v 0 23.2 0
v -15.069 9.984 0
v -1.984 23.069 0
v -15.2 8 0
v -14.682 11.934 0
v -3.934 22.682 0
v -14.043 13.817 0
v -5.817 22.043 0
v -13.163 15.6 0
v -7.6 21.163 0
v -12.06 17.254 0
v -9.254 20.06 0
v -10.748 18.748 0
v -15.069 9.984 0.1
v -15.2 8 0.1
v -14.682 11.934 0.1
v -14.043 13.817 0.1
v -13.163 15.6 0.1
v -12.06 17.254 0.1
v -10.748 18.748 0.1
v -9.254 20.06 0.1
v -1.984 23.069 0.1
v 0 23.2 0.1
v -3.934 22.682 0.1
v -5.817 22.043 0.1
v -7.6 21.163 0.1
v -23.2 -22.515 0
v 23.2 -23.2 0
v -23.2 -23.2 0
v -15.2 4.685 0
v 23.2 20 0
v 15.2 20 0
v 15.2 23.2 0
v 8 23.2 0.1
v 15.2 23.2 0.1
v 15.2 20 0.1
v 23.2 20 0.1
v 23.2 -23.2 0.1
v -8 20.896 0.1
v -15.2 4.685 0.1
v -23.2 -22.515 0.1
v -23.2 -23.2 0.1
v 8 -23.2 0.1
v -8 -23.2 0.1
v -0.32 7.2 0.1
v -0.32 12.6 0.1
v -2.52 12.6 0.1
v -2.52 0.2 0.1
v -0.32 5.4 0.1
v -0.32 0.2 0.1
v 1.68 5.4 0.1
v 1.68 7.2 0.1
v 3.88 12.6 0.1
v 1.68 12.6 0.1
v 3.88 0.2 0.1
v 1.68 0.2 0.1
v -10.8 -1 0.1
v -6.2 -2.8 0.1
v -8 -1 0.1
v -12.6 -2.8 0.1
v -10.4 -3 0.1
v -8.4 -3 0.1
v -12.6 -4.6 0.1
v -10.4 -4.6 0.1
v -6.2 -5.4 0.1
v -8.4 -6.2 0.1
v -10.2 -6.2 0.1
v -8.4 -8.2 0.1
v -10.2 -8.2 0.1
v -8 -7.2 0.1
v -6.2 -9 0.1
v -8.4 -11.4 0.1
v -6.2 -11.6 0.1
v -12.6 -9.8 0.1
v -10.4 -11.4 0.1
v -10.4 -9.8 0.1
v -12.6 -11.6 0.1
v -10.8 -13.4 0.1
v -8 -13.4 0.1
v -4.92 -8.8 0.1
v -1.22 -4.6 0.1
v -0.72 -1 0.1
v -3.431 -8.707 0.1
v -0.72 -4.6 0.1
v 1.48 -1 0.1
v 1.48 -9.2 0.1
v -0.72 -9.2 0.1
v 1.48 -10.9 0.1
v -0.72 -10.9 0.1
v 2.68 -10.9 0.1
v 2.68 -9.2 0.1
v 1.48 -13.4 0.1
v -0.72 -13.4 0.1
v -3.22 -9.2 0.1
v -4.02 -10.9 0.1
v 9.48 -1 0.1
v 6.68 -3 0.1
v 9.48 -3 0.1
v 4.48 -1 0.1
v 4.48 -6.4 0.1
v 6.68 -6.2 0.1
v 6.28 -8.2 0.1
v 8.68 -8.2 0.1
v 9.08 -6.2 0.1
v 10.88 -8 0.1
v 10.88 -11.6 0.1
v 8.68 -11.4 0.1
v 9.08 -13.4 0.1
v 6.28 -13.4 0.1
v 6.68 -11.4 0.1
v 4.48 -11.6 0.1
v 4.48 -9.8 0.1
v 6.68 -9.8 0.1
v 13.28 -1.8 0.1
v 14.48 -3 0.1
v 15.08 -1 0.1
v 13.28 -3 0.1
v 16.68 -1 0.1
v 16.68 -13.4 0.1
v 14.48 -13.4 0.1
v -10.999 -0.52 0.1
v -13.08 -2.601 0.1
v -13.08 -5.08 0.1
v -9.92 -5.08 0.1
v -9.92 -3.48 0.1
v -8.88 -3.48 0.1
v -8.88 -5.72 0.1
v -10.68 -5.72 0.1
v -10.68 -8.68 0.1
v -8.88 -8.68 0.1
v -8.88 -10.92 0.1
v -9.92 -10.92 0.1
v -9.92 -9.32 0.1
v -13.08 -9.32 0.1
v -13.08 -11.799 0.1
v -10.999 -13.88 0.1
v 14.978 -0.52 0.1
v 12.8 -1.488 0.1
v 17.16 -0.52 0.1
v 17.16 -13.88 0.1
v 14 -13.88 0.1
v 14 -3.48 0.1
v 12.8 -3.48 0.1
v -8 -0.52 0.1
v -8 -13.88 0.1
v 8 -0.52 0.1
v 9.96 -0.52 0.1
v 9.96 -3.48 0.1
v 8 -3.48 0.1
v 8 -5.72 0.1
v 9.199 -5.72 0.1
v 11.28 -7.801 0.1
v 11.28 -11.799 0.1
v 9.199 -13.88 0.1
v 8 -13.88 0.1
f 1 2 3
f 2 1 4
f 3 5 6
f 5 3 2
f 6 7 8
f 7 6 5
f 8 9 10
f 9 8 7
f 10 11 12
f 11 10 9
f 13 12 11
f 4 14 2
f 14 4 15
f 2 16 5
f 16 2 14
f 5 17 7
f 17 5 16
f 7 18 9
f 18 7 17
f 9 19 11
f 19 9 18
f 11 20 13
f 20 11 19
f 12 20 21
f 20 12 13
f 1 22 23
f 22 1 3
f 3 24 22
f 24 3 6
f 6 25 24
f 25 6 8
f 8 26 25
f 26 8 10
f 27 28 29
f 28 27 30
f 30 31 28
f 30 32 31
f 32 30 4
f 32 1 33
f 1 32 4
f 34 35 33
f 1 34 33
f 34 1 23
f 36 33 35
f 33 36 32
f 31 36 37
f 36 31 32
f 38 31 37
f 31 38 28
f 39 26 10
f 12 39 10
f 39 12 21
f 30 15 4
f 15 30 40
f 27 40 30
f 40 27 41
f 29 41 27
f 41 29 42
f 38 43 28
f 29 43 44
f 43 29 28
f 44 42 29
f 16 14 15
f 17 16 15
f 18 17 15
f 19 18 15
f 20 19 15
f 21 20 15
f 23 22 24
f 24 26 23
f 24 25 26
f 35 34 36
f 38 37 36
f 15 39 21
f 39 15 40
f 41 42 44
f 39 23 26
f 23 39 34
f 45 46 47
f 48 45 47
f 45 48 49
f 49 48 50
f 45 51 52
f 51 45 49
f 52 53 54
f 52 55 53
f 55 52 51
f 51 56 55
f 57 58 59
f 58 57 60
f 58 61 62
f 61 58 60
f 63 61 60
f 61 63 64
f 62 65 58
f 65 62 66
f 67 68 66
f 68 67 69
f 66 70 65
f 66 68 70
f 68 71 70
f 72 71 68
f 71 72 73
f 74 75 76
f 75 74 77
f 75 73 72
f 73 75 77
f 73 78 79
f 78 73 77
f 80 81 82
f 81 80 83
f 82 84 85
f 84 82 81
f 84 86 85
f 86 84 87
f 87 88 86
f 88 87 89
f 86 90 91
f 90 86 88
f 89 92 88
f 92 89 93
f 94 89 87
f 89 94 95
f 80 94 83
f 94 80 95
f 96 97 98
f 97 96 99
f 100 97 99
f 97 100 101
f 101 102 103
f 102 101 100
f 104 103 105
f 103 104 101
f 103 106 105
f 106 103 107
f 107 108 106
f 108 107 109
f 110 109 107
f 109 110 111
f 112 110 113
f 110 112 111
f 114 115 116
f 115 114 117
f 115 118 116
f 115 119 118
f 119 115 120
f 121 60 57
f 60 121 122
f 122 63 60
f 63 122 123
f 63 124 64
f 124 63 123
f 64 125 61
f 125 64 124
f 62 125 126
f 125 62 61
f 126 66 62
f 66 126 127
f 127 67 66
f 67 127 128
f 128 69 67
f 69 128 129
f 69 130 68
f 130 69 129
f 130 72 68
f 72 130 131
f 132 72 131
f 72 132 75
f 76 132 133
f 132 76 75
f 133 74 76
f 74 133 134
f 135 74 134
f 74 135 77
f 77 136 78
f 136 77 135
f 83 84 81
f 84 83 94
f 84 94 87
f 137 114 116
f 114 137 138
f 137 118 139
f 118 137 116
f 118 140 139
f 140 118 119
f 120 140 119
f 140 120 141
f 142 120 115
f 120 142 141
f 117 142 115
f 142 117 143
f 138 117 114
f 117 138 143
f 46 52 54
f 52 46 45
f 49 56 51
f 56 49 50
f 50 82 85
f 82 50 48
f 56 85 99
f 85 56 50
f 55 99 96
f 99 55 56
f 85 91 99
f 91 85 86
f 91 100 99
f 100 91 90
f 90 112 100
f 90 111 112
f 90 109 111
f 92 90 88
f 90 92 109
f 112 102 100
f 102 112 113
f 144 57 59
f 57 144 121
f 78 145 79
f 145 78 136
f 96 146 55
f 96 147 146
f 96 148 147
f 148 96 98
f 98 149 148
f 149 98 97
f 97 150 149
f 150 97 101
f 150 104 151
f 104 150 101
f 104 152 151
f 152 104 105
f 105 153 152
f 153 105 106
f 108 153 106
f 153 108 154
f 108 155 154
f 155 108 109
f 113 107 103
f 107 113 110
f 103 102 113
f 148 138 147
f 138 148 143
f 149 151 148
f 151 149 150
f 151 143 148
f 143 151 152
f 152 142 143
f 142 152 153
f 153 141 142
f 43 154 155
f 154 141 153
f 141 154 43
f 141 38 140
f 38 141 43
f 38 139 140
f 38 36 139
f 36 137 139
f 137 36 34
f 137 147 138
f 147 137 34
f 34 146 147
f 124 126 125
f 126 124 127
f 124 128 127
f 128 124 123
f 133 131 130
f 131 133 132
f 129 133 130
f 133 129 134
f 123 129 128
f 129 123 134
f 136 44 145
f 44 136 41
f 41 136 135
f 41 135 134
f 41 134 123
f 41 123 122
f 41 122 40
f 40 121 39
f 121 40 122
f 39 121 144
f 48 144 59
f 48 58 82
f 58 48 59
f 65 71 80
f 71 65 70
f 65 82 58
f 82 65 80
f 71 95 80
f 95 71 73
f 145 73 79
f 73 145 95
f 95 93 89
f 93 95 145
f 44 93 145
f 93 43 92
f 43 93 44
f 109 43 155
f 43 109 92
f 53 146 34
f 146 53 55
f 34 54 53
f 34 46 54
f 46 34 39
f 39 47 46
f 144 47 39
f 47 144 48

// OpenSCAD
// file: ../p/48/7-48cyli.scad
use <../../lib.scad>
function ldraw_lib__48__7_48cyli() = [
// 0 Hi-Res Cylinder 0.1458
// 0 Name: 48\7-48cyli.dat
// 0 Author: Philippe Hurbain [Philo]
// 0 !LDRAW_ORG 48_Primitive UPDATE 2013-01
// 0 !LICENSE Licensed under CC BY 4.0 : see CAreadme.txt
// 
// 0 BFC CERTIFY CCW
  [0,"BFC","CERTIFY"],
  [0,"BFC","CCW"],
// 
// 0 !HISTORY 2013-07-21 [PTadmin] Official Update 2013-01
// 
// 
// 4 16 0.9914 0 0.1305 1 0 0 1 1 0 0.9914 1 0.1305
  [4,16,0.9914,0,0.1305,1,0,0,1,1,0,0.9914,1,0.1305],
// 4 16 0.9659 0 0.2588 0.9914 0 0.1305 0.9914 1 0.1305 0.9659 1 0.2588
  [4,16,0.9659,0,0.2588,0.9914,0,0.1305,0.9914,1,0.1305,0.9659,1,0.2588],
// 4 16 0.9239 0 0.3827 0.9659 0 0.2588 0.9659 1 0.2588 0.9239 1 0.3827
  [4,16,0.9239,0,0.3827,0.9659,0,0.2588,0.9659,1,0.2588,0.9239,1,0.3827],
// 4 16 0.866 0 0.5 0.9239 0 0.3827 0.9239 1 0.3827 0.866 1 0.5
  [4,16,0.866,0,0.5,0.9239,0,0.3827,0.9239,1,0.3827,0.866,1,0.5],
// 4 16 0.7934 0 0.6088 0.866 0 0.5 0.866 1 0.5 0.7934 1 0.6088
  [4,16,0.7934,0,0.6088,0.866,0,0.5,0.866,1,0.5,0.7934,1,0.6088],
// 4 16 0.7071 0 0.7071 0.7934 0 0.6088 0.7934 1 0.6088 0.7071 1 0.7071
  [4,16,0.7071,0,0.7071,0.7934,0,0.6088,0.7934,1,0.6088,0.7071,1,0.7071],
// 4 16 0.6088 0 0.7934 0.7071 0 0.7071 0.7071 1 0.7071 0.6088 1 0.7934
  [4,16,0.6088,0,0.7934,0.7071,0,0.7071,0.7071,1,0.7071,0.6088,1,0.7934],
// 0 // conditional lines
// 5 24 1 1 0 1 0 0 1 1 -0.1317 0.9914 1 0.1305
  [5,24,1,1,0,1,0,0,1,1,-0.1317,0.9914,1,0.1305],
// 5 24 0.9914 1 0.1305 0.9914 0 0.1305 1 1 0 0.9659 1 0.2588
  [5,24,0.9914,1,0.1305,0.9914,0,0.1305,1,1,0,0.9659,1,0.2588],
// 5 24 0.9659 1 0.2588 0.9659 0 0.2588 0.9914 1 0.1305 0.9239 1 0.3827
  [5,24,0.9659,1,0.2588,0.9659,0,0.2588,0.9914,1,0.1305,0.9239,1,0.3827],
// 5 24 0.9239 1 0.3827 0.9239 0 0.3827 0.9659 1 0.2588 0.866 1 0.5
  [5,24,0.9239,1,0.3827,0.9239,0,0.3827,0.9659,1,0.2588,0.866,1,0.5],
// 5 24 0.866 1 0.5 0.866 0 0.5 0.9239 1 0.3827 0.7934 1 0.6088
  [5,24,0.866,1,0.5,0.866,0,0.5,0.9239,1,0.3827,0.7934,1,0.6088],
// 5 24 0.7934 1 0.6088 0.7934 0 0.6088 0.866 1 0.5 0.7071 1 0.7071
  [5,24,0.7934,1,0.6088,0.7934,0,0.6088,0.866,1,0.5,0.7071,1,0.7071],
// 5 24 0.7071 1 0.7071 0.7071 0 0.7071 0.7934 1 0.6088 0.6088 1 0.7934
  [5,24,0.7071,1,0.7071,0.7071,0,0.7071,0.7934,1,0.6088,0.6088,1,0.7934],
// 5 24 0.6088 1 0.7934 0.6088 0 0.7934 0.7071 1 0.7071 0.5043 1 0.8735
  [5,24,0.6088,1,0.7934,0.6088,0,0.7934,0.7071,1,0.7071,0.5043,1,0.8735],
// 0 // Build by Primitive Generator 2
];
module ldraw_lib__48__7_48cyli(step=0, col=false, unit=2/5, alt=false, line=0.2, solid=!$preview)
    makepoly(ldraw_lib__48__7_48cyli(), step=step, col=col, unit=unit, alt=alt, line=line, solid=solid);
ldraw_lib__48__7_48cyli(line=0.2);
// file: ../p/48/7-48chrd.scad
use <../../lib.scad>
function ldraw_lib__48__7_48chrd() = [
// 0 Hi-Res Chord 0.1458
// 0 Name: 48\7-48chrd.dat
// 0 Author: Philippe Hurbain [Philo]
// 0 !LDRAW_ORG 48_Primitive UPDATE 2013-01
// 0 !LICENSE Licensed under CC BY 4.0 : see CAreadme.txt
// 
// 0 BFC CERTIFY CCW
  [0,"BFC","CERTIFY"],
  [0,"BFC","CCW"],
// 
// 0 !HISTORY 2013-07-21 [PTadmin] Official Update 2013-01
// 
// 
// 3 16 1 0 0 0.9914 0 0.1305 0.9659 0 0.2588
  [3,16,1,0,0,0.9914,0,0.1305,0.9659,0,0.2588],
// 3 16 1 0 0 0.9659 0 0.2588 0.9239 0 0.3827
  [3,16,1,0,0,0.9659,0,0.2588,0.9239,0,0.3827],
// 3 16 1 0 0 0.9239 0 0.3827 0.866 0 0.5
  [3,16,1,0,0,0.9239,0,0.3827,0.866,0,0.5],
// 3 16 1 0 0 0.866 0 0.5 0.7934 0 0.6088
  [3,16,1,0,0,0.866,0,0.5,0.7934,0,0.6088],
// 3 16 1 0 0 0.7934 0 0.6088 0.7071 0 0.7071
  [3,16,1,0,0,0.7934,0,0.6088,0.7071,0,0.7071],
// 3 16 1 0 0 0.7071 0 0.7071 0.6088 0 0.7934
  [3,16,1,0,0,0.7071,0,0.7071,0.6088,0,0.7934],
// 0 // Build by Primitive Generator 2
];
module ldraw_lib__48__7_48chrd(step=0, col=false, unit=2/5, alt=false, line=0.2, solid=!$preview)
    makepoly(ldraw_lib__48__7_48chrd(), step=step, col=col, unit=unit, alt=alt, line=line, solid=solid);
ldraw_lib__48__7_48chrd(line=0.2);
// file: ../p/48/1-4chrd.scad
use <../../lib.scad>
function ldraw_lib__48__1_4chrd() = [
// 0 Hi-Res Chord 0.25
// 0 Name: 48\1-4chrd.dat
// 0 Author: Willy Tschager [Holly-Wood]
// 0 !LDRAW_ORG 48_Primitive UPDATE 2024-01
// 0 !LICENSE Licensed under CC BY 4.0 : see CAreadme.txt
// 
// 0 BFC CERTIFY CCW
  [0,"BFC","CERTIFY"],
  [0,"BFC","CCW"],
// 
// 0 !HISTORY 2009-05-02 [PTadmin] Official Update 2009-01
// 0 !HISTORY 2012-08-02 [MMR1988] Re-creation with PrimGen2 and Rectifier
// 0 !HISTORY 2012-08-09 [PTadmin] Official Update 2012-02
// 0 !HISTORY 2024-01-04 [Holly-Wood] Complete re-write, original by westrate
// 0 !HISTORY 2024-01-29 [OrionP] Official Update 2024-01
// 
// 0 // Vertices calculated by LDPartEditor (PrimGen 2.X)
// 
// 4 16 0 0 1 1 0 0 .9914 0 .1305 .1305 0 .9914
  [4,16,0,0,1,1,0,0,.9914,0,.1305,.1305,0,.9914],
// 4 16 .1305 0 .9914 .9914 0 .1305 .9659 0 .2588 .2588 0 .9659
  [4,16,.1305,0,.9914,.9914,0,.1305,.9659,0,.2588,.2588,0,.9659],
// 4 16 .2588 0 .9659 .9659 0 .2588 .9239 0 .3827 .3827 0 .9239
  [4,16,.2588,0,.9659,.9659,0,.2588,.9239,0,.3827,.3827,0,.9239],
// 4 16 .3827 0 .9239 .9239 0 .3827 .866 0 .5 .5 0 .866
  [4,16,.3827,0,.9239,.9239,0,.3827,.866,0,.5,.5,0,.866],
// 4 16 .5 0 .866 .866 0 .5 .7934 0 .6088 .6088 0 .7934
  [4,16,.5,0,.866,.866,0,.5,.7934,0,.6088,.6088,0,.7934],
// 3 16 .6088 0 .7934 .7934 0 .6088 .7071 0 .7071
  [3,16,.6088,0,.7934,.7934,0,.6088,.7071,0,.7071],
];
module ldraw_lib__48__1_4chrd(step=0, col=false, unit=2/5, alt=false, line=0.2, solid=!$preview)
    makepoly(ldraw_lib__48__1_4chrd(), step=step, col=col, unit=unit, alt=alt, line=line, solid=solid);
ldraw_lib__48__1_4chrd(line=0.2);
// file: ../p/48/1-12cyli.scad
use <../../lib.scad>
function ldraw_lib__48__1_12cyli() = [
// 0 Hi-Res Cylinder 0.0833
// 0 Name: 48\1-12cyli.dat
// 0 Author: Willy Tschager [Holly-Wood]
// 0 !LDRAW_ORG 48_Primitive UPDATE 2024-01
// 0 !LICENSE Licensed under CC BY 4.0 : see CAreadme.txt
// 
// 0 BFC CERTIFY CCW
  [0,"BFC","CERTIFY"],
  [0,"BFC","CCW"],
// 
// 0 !HISTORY 2009-05-02 [PTadmin] Official Update 2009-01
// 0 !HISTORY 2024-01-08 [Holly-Wood] Complete regeneration, original by westrate
// 0 !HISTORY 2024-01-29 [OrionP] Official Update 2024-01
// 
// 4 16 0.9914 0 0.1305 1 0 0 1 1 0 0.9914 1 0.1305
  [4,16,0.9914,0,0.1305,1,0,0,1,1,0,0.9914,1,0.1305],
// 4 16 0.9659 0 0.2588 0.9914 0 0.1305 0.9914 1 0.1305 0.9659 1 0.2588
  [4,16,0.9659,0,0.2588,0.9914,0,0.1305,0.9914,1,0.1305,0.9659,1,0.2588],
// 4 16 0.9239 0 0.3827 0.9659 0 0.2588 0.9659 1 0.2588 0.9239 1 0.3827
  [4,16,0.9239,0,0.3827,0.9659,0,0.2588,0.9659,1,0.2588,0.9239,1,0.3827],
// 4 16 0.866 0 0.5 0.9239 0 0.3827 0.9239 1 0.3827 0.866 1 0.5
  [4,16,0.866,0,0.5,0.9239,0,0.3827,0.9239,1,0.3827,0.866,1,0.5],
// 0 // conditional lines
// 5 24 1 1 0 1 0 0 1 1 -0.1317 0.9914 1 0.1305
  [5,24,1,1,0,1,0,0,1,1,-0.1317,0.9914,1,0.1305],
// 5 24 0.9914 1 0.1305 0.9914 0 0.1305 1 1 0 0.9659 1 0.2588
  [5,24,0.9914,1,0.1305,0.9914,0,0.1305,1,1,0,0.9659,1,0.2588],
// 5 24 0.9659 1 0.2588 0.9659 0 0.2588 0.9914 1 0.1305 0.9239 1 0.3827
  [5,24,0.9659,1,0.2588,0.9659,0,0.2588,0.9914,1,0.1305,0.9239,1,0.3827],
// 5 24 0.9239 1 0.3827 0.9239 0 0.3827 0.9659 1 0.2588 0.866 1 0.5
  [5,24,0.9239,1,0.3827,0.9239,0,0.3827,0.9659,1,0.2588,0.866,1,0.5],
// 5 24 0.866 1 0.5 0.866 0 0.5 0.9239 1 0.3827 0.8002 1 0.614
  [5,24,0.866,1,0.5,0.866,0,0.5,0.9239,1,0.3827,0.8002,1,0.614],
// 0 // Build by LDPartEditor (PrimGen 2.X)
];
module ldraw_lib__48__1_12cyli(step=0, col=false, unit=2/5, alt=false, line=0.2, solid=!$preview)
    makepoly(ldraw_lib__48__1_12cyli(), step=step, col=col, unit=unit, alt=alt, line=line, solid=solid);
ldraw_lib__48__1_12cyli(line=0.2);
// file: ../p/48/1-12chrd.scad
use <../../lib.scad>
function ldraw_lib__48__1_12chrd() = [
// 0 Hi-Res Chord 0.0833
// 0 Name: 48\1-12chrd.dat
// 0 Author: Willy Tschager [Holly-Wood]
// 0 !LDRAW_ORG 48_Primitive UPDATE 2024-01
// 0 !LICENSE Licensed under CC BY 4.0 : see CAreadme.txt
// 
// 0 BFC CERTIFY CCW
  [0,"BFC","CERTIFY"],
  [0,"BFC","CCW"],
// 
// 0 !HISTORY 2009-05-02 [PTadmin] Official Update 2009-01
// 0 !HISTORY 2024-01-09 [Holly-Wood] Complete re-write, original by westrate
// 0 !HISTORY 2024-01-29 [OrionP] Official Update 2024-01
// 
// 4 16 .866 0 .5 1 0 0 .9914 0 .1305 .9239 0 .3827
  [4,16,.866,0,.5,1,0,0,.9914,0,.1305,.9239,0,.3827],
// 3 16 .9239 0 .3827 .9914 0 .1305 .9659 0 .2588
  [3,16,.9239,0,.3827,.9914,0,.1305,.9659,0,.2588],
// 0 // Build by LDPartEditor (PrimGen 2.X)
];
module ldraw_lib__48__1_12chrd(step=0, col=false, unit=2/5, alt=false, line=0.2, solid=!$preview)
    makepoly(ldraw_lib__48__1_12chrd(), step=step, col=col, unit=unit, alt=alt, line=line, solid=solid);
ldraw_lib__48__1_12chrd(line=0.2);
// file: s/4162510as01.scad
use <../../lib.scad>
use <../../p/48/1-12chrd.scad>
use <../../p/48/1-12cyli.scad>
use <../../p/48/1-4chrd.scad>
use <../../p/48/7-48chrd.scad>
use <../../p/48/7-48cyli.scad>
function ldraw_lib__s__4162510as01() = [
// 0 ~Sticker  5.8 x  5.8 with Black "H3451" on Blue, Red and White Stripes Left - Common Part
// 0 Name: s\4162510as01.dat
// 0 Author: Massimo Maso [Sirio]
// 0 !LDRAW_ORG Subpart UPDATE 2024-09
// 0 !LICENSE Licensed under CC BY 4.0 : see CAreadme.txt
// 
// 0 BFC CERTIFY CCW
  [0,"BFC","CERTIFY"],
  [0,"BFC","CCW"],
// 
// 0 !HISTORY 2024-10-27 [OrionP] Official Update 2024-09
// 
// 
// 0 // Primitives
// 1 16 0 0 20 38 0 0 0 -1 0 0 0 38 48\1-4chrd.dat
  [1,16,0,0,20,38,0,0,0,-1,0,0,0,38, ldraw_lib__48__1_4chrd()],
// 1 16 0 -0.25 20 38 0 0 0 0.25 0 0 0 38 48\7-48cyli.dat
  [1,16,0,-0.25,20,38,0,0,0,0.25,0,0,0,38, ldraw_lib__48__7_48cyli()],
// 1 16 0 -0.25 20 0 0 38 0 0.25 0 38 0 0 48\1-12cyli.dat
  [1,16,0,-0.25,20,0,0,38,0,0.25,0,38,0,0, ldraw_lib__48__1_12cyli()],
// 0 // Bottom face
// 4 16 -58 0 -58 38 0 11.712 58 0 -56.288 58 0 -58
  [4,16,-58,0,-58,38,0,11.712,58,0,-56.288,58,0,-58],
// 3 16 -58 0 -58 -58 0 50 38 0 11.712
  [3,16,-58,0,-58,-58,0,50,38,0,11.712],
// 4 16 -38 0 50 38 0 20 38 0 11.712 -58 0 50
  [4,16,-38,0,50,38,0,20,38,0,11.712,-58,0,50],
// 4 16 -38 0 50 -38 0 58 0 0 58 38 0 20
  [4,16,-38,0,50,-38,0,58,0,0,58,38,0,20],
// 0 // Lateral face
// 3 16 -38 0 58 -38 -.25 58 -20 -.25 58
  [3,16,-38,0,58,-38,-.25,58,-20,-.25,58],
// 4 16 -38 0 58 -20 -.25 58 0 -.25 58 0 0 58
  [4,16,-38,0,58,-20,-.25,58,0,-.25,58,0,0,58],
// 4 16 -38 0 58 -38 0 50 -38 -.25 50 -38 -.25 58
  [4,16,-38,0,58,-38,0,50,-38,-.25,50,-38,-.25,58],
// 4 16 -58 0 50 -58 -.25 50 -38 -.25 50 -38 0 50
  [4,16,-58,0,50,-58,-.25,50,-38,-.25,50,-38,0,50],
// 4 16 -58 0 50 -58 0 -58 -58 -.25 -58 -58 -.25 50
  [4,16,-58,0,50,-58,0,-58,-58,-.25,-58,-58,-.25,50],
// 3 16 19 0 52.908 19 -.25 52.908 20 -.25 52.24072
  [3,16,19,0,52.908,19,-.25,52.908,20,-.25,52.24072],
// 4 16 19 0 52.908 20 -.25 52.24072 23.1344 -.25 50.1492 23.1344 0 50.1492
  [4,16,19,0,52.908,20,-.25,52.24072,23.1344,-.25,50.1492,23.1344,0,50.1492],
// 4 16 38 0 11.712 38 0 20 38 -.25 20 38 -.25 11.712
  [4,16,38,0,11.712,38,0,20,38,-.25,20,38,-.25,11.712],
// 4 16 38 0 11.712 38 -.25 11.712 58 -.25 -56.288 58 0 -56.288
  [4,16,38,0,11.712,38,-.25,11.712,58,-.25,-56.288,58,0,-56.288],
// 4 16 58 0 -58 58 0 -56.288 58 -.25 -56.288 58 -.25 -58
  [4,16,58,0,-58,58,0,-56.288,58,-.25,-56.288,58,-.25,-58],
// 3 16 -58 0 -58 -20 -.25 -58 -58 -.25 -58
  [3,16,-58,0,-58,-20,-.25,-58,-58,-.25,-58],
// 4 16 -58 0 -58 58 0 -58 20 -.25 -58 -20 -.25 -58
  [4,16,-58,0,-58,58,0,-58,20,-.25,-58,-20,-.25,-58],
// 3 16 58 0 -58 58 -.25 -58 20 -.25 -58
  [3,16,58,0,-58,58,-.25,-58,20,-.25,-58],
// 0 // Conditional lines
// 5 24 23.1344 0 50.1492 23.1344 -.25 50.1492 26.8698 0 46.8698 19 0 52.908
  [5,24,23.1344,0,50.1492,23.1344,-.25,50.1492,26.8698,0,46.8698,19,0,52.908],
// 5 24 19 0 52.908 19 -.25 52.908 14.5426 0 55.1082 23.1344 0 50.1492
  [5,24,19,0,52.908,19,-.25,52.908,14.5426,0,55.1082,23.1344,0,50.1492],
// 0 // Top faces
// 0 // Primitives
// 1 4 0 -0.25 20 38 0 0 0 1 0 0 0 38 48\7-48chrd.dat
  [1,4,0,-0.25,20,38,0,0,0,1,0,0,0,38, ldraw_lib__48__7_48chrd()],
// 1 15 0 -0.25 20 0 0 38 0 1 0 38 0 0 48\1-12chrd.dat
  [1,15,0,-0.25,20,0,0,38,0,1,0,38,0,0, ldraw_lib__48__1_12chrd()],
// 0 // Blue faces
// 3 1 -38 -.25 50 -20 -.25 58 -38 -.25 58
  [3,1,-38,-.25,50,-20,-.25,58,-38,-.25,58],
// 3 1 -38 -.25 50 -58 -.25 50 -58 -.25 -58
  [3,1,-38,-.25,50,-58,-.25,50,-58,-.25,-58],
// 0 // Red faces
// 4 4 20 -.25 52.24072 38 -.25 11.712 38 -.25 20 23.1344 -.25 50.1492
  [4,4,20,-.25,52.24072,38,-.25,11.712,38,-.25,20,23.1344,-.25,50.1492],
// 3 4 20 -.25 -58 58 -.25 -58 58 -.25 -56.288
  [3,4,20,-.25,-58,58,-.25,-58,58,-.25,-56.288],
// 0 // White face
// 4 15 20 -.25 52.24072 19 -.25 52.908 0 -.25 58 -20 -.25 58
  [4,15,20,-.25,52.24072,19,-.25,52.908,0,-.25,58,-20,-.25,58],
];
module ldraw_lib__s__4162510as01(step=0, col=false, unit=2/5, alt=false, line=0.2, solid=!$preview)
    makepoly(ldraw_lib__s__4162510as01(), step=step, col=col, unit=unit, alt=alt, line=line, solid=solid);
ldraw_lib__s__4162510as01(line=0.2);
// main file
use <../lib.scad>
use <s/4162510as01.scad>
use <s/4162510as02.scad>
function ldraw_lib__4162510b() = [
// 0 Sticker  5.8 x  5.8 with Black "H3451" on Blue, Red and White Stripes Right
// 0 Name: 4162510b.dat
// 0 Author: Massimo Maso [Sirio]
// 0 !LDRAW_ORG Part UPDATE 2024-09
// 0 !LICENSE Licensed under CC BY 4.0 : see CAreadme.txt
// 
// 0 BFC CERTIFY CCW
  [0,"BFC","CERTIFY"],
  [0,"BFC","CCW"],
// 
// 0 !KEYWORDS Biplane, Camel, Sculptures, Set 3451, Sopwith
// 
// 0 !HISTORY 2024-10-27 [OrionP] Official Update 2024-09
// 
// 0 // Subparts
// 1 16 0 0 0 -1 0 0 0 1 0 0 0 1 s\4162510as01.dat
  [1,16,0,0,0,-1,0,0,0,1,0,0,0,1, ldraw_lib__s__4162510as01()],
// 1 16 11.2 0 0 1 0 0 0 1 0 0 0 1 s\4162510as02.dat
  [1,16,11.2,0,0,1,0,0,0,1,0,0,0,1, ldraw_lib__s__4162510as02()],
// 0 // Top faces
// 0 // Frame of number "3"
// 4 15 -20 -.25 -2.5 -20 -.25 -1.3 -27.4971 -.25 -1.3 -27 -.25 -2.5
  [4,15,-20,-.25,-2.5,-20,-.25,-1.3,-27.4971,-.25,-1.3,-27,-.25,-2.5],
// 4 15 -20 -.25 -33.5 -27 -.25 -33.5 -27.4971 -.25 -34.7 -20 -.25 -34.7
  [4,15,-20,-.25,-33.5,-27,-.25,-33.5,-27.4971,-.25,-34.7,-20,-.25,-34.7],
// 0 // Frame of number "5"
// 3 15 23.7 -.25 -2.5 20 -.25 -1.3 9.7 -.25 .5
  [3,15,23.7,-.25,-2.5,20,-.25,-1.3,9.7,-.25,.5],
// 3 15 23.7 -.25 -2.5 24.9 -.25 -1.3 20 -.25 -1.3
  [3,15,23.7,-.25,-2.5,24.9,-.25,-1.3,20,-.25,-1.3],
// 4 15 23.7 -.25 -2.5 23.7 -.25 -7.5 24.9 -.25 -8.7 24.9 -.25 -1.3
  [4,15,23.7,-.25,-2.5,23.7,-.25,-7.5,24.9,-.25,-8.7,24.9,-.25,-1.3],
// 4 15 16.7 -.25 -7.5 20 -.25 -8.7 24.9 -.25 -8.7 23.7 -.25 -7.5
  [4,15,16.7,-.25,-7.5,20,-.25,-8.7,24.9,-.25,-8.7,23.7,-.25,-7.5],
// 4 15 16.7 -.25 -7.5 16.7 -.25 -15.5 20 -.25 -14.3 20 -.25 -8.7
  [4,15,16.7,-.25,-7.5,16.7,-.25,-15.5,20,-.25,-14.3,20,-.25,-8.7],
// 4 15 22.7 -.25 -15.5 22.9971 -.25 -14.3 20 -.25 -14.3 16.7 -.25 -15.5
  [4,15,22.7,-.25,-15.5,22.9971,-.25,-14.3,20,-.25,-14.3,16.7,-.25,-15.5],
// 4 15 22.7 -.25 -15.5 27.2 -.25 -20 28.2 -.25 -19.5029 22.9971 -.25 -14.3
  [4,15,22.7,-.25,-15.5,27.2,-.25,-20,28.2,-.25,-19.5029,22.9971,-.25,-14.3],
// 4 15 27.2 -.25 -29 28.2 -.25 -29.4971 28.2 -.25 -19.5029 27.2 -.25 -20
  [4,15,27.2,-.25,-29,28.2,-.25,-29.4971,28.2,-.25,-19.5029,27.2,-.25,-20],
// 4 15 27.2 -.25 -29 22.7 -.25 -33.5 22.9971 -.25 -34.7 28.2 -.25 -29.4971
  [4,15,27.2,-.25,-29,22.7,-.25,-33.5,22.9971,-.25,-34.7,28.2,-.25,-29.4971],
// 4 15 15.7 -.25 -33.5 20 -.25 -34.7 22.9971 -.25 -34.7 22.7 -.25 -33.5
  [4,15,15.7,-.25,-33.5,20,-.25,-34.7,22.9971,-.25,-34.7,22.7,-.25,-33.5],
// 4 15 21.7 -.25 -20.5 16.7 -.25 -24.5 16.7 -.25 -28.5 21.7 -.25 -28.5
  [4,15,21.7,-.25,-20.5,16.7,-.25,-24.5,16.7,-.25,-28.5,21.7,-.25,-28.5],
// 3 15 21.7 -.25 -20.5 15.7 -.25 -20.5 16.7 -.25 -24.5
  [3,15,21.7,-.25,-20.5,15.7,-.25,-20.5,16.7,-.25,-24.5],
// 0 // Blue faces
// 4 1 24.9 -.25 -8.7 32 -.25 -8.7 32 -.25 -3.7202 24.9 -.25 -1.3
  [4,1,24.9,-.25,-8.7,32,-.25,-8.7,32,-.25,-3.7202,24.9,-.25,-1.3],
// 4 1 24.9 -.25 -8.7 20 -.25 -8.7 20 -.25 -14.3 22.9971 -.25 -14.3
  [4,1,24.9,-.25,-8.7,20,-.25,-8.7,20,-.25,-14.3,22.9971,-.25,-14.3],
// 4 1 24.9 -.25 -8.7 22.9971 -.25 -14.3 28.2 -.25 -19.5029 32 -.25 -8.7
  [4,1,24.9,-.25,-8.7,22.9971,-.25,-14.3,28.2,-.25,-19.5029,32,-.25,-8.7],
// 4 1 28.2 -.25 -29.4971 35 -.25 -8.7 32 -.25 -8.7 28.2 -.25 -19.5029
  [4,1,28.2,-.25,-29.4971,35,-.25,-8.7,32,-.25,-8.7,28.2,-.25,-19.5029],
// 3 1 28.2 -.25 -29.4971 35 -.25 -34.7 35 -.25 -8.7
  [3,1,28.2,-.25,-29.4971,35,-.25,-34.7,35,-.25,-8.7],
// 3 1 20 -.25 -58 22.9971 -.25 -34.7 20 -.25 -34.7
  [3,1,20,-.25,-58,22.9971,-.25,-34.7,20,-.25,-34.7],
// 4 1 20 -.25 -58 35 -.25 -34.7 28.2 -.25 -29.4971 22.9971 -.25 -34.7
  [4,1,20,-.25,-58,35,-.25,-34.7,28.2,-.25,-29.4971,22.9971,-.25,-34.7],
// 4 1 20 -.25 -58 58 -.25 -58 42.9 -.25 -34.7 35 -.25 -34.7
  [4,1,20,-.25,-58,58,-.25,-58,42.9,-.25,-34.7,35,-.25,-34.7],
// 3 1 58 -.25 -58 42.9 -.25 -1.3 42.9 -.25 -34.7
  [3,1,58,-.25,-58,42.9,-.25,-1.3,42.9,-.25,-34.7],
// 3 1 58 -.25 -58 38 -.25 50 42.9 -.25 -1.3
  [3,1,58,-.25,-58,38,-.25,50,42.9,-.25,-1.3],
// 4 1 20 -.25 58 37.4453 -.25 -1.3 42.9 -.25 -1.3 38 -.25 50
  [4,1,20,-.25,58,37.4453,-.25,-1.3,42.9,-.25,-1.3,38,-.25,50],
// 4 1 20 -.25 58 24.9 -.25 -1.3 32 -.25 -3.7202 37.4453 -.25 -1.3
  [4,1,20,-.25,58,24.9,-.25,-1.3,32,-.25,-3.7202,37.4453,-.25,-1.3],
// 3 1 20 -.25 58 20 -.25 -1.3 24.9 -.25 -1.3
  [3,1,20,-.25,58,20,-.25,-1.3,24.9,-.25,-1.3],
// 0 // Red faces
// 4 4 -22.2 -.25 -14.3 -22.2 -.25 -8.7 -24.8 -.25 -8.7 -24.8 -.25 -12.7
  [4,4,-22.2,-.25,-14.3,-22.2,-.25,-8.7,-24.8,-.25,-8.7,-24.8,-.25,-12.7],
// 4 4 -22.2 -.25 -14.3 -24.8 -.25 -12.7 -32.7 -.25 -12.7 -26.7 -.25 -14.3
  [4,4,-22.2,-.25,-14.3,-24.8,-.25,-12.7,-32.7,-.25,-12.7,-26.7,-.25,-14.3],
// 4 4 -22.2 -.25 -21.7 -24.8 -.25 -23.3 -24.8 -.25 -27.3 -22.2 -.25 -27.3
  [4,4,-22.2,-.25,-21.7,-24.8,-.25,-23.3,-24.8,-.25,-27.3,-22.2,-.25,-27.3],
// 4 4 -22.2 -.25 -21.7 -26.7 -.25 -21.7 -32.7 -.25 -23.3 -24.8 -.25 -23.3
  [4,4,-22.2,-.25,-21.7,-26.7,-.25,-21.7,-32.7,-.25,-23.3,-24.8,-.25,-23.3],
// 4 4 -32.7 -.25 -23.3 -26.7 -.25 -21.7 -26.7 -.25 -14.3 -32.7 -.25 -12.7
  [4,4,-32.7,-.25,-23.3,-26.7,-.25,-21.7,-26.7,-.25,-14.3,-32.7,-.25,-12.7],
// 4 4 -58 -.25 -56.288 -20 -.25 -58 -20 -.25 -34.7 -27.4971 -.25 -34.7
  [4,4,-58,-.25,-56.288,-20,-.25,-58,-20,-.25,-34.7,-27.4971,-.25,-34.7],
// 3 4 -58 -.25 -56.288 -27.4971 -.25 -34.7 -32.7 -.25 -29.4971
  [3,4,-58,-.25,-56.288,-27.4971,-.25,-34.7,-32.7,-.25,-29.4971],
// 3 4 -58 -.25 -56.288 -32.7 -.25 -29.4971 -32.7 -.25 -23.3
  [3,4,-58,-.25,-56.288,-32.7,-.25,-29.4971,-32.7,-.25,-23.3],
// 3 4 -58 -.25 -56.288 -32.7 -.25 -23.3 -32.7 -.25 -12.7
  [3,4,-58,-.25,-56.288,-32.7,-.25,-23.3,-32.7,-.25,-12.7],
// 3 4 -58 -.25 -56.288 -32.7 -.25 -12.7 -32.7 -.25 -6.5029
  [3,4,-58,-.25,-56.288,-32.7,-.25,-12.7,-32.7,-.25,-6.5029],
// 3 4 -58 -.25 -56.288 -32.7 -.25 -6.5029 -38 -.25 11.712
  [3,4,-58,-.25,-56.288,-32.7,-.25,-6.5029,-38,-.25,11.712],
// 4 4 -20 -.25 52.24072 -38 -.25 11.712 -32.7 -.25 -6.5029 -27.4971 -.25 -1.3
  [4,4,-20,-.25,52.24072,-38,-.25,11.712,-32.7,-.25,-6.5029,-27.4971,-.25,-1.3],
// 3 4 -20 -.25 52.24072 -27.4971 -.25 -1.3 -20 -.25 -1.3
  [3,4,-20,-.25,52.24072,-27.4971,-.25,-1.3,-20,-.25,-1.3],
// 0 // White faces
// 3 15 -6.3 -.25 .5 -20 -.25 -1.3 -20 -.25 -2.5
  [3,15,-6.3,-.25,.5,-20,-.25,-1.3,-20,-.25,-2.5],
// 4 15 -6.3 -.25 .5 -20 -.25 -2.5 -15.5 -.25 -7 -1.8 -.25 -2.5
  [4,15,-6.3,-.25,.5,-20,-.25,-2.5,-15.5,-.25,-7,-1.8,-.25,-2.5],
// 4 15 -12.3 -.25 -22 -15.5 -.25 -13.5 -20 -.25 -18 -15.5 -.25 -22.5
  [4,15,-12.3,-.25,-22,-15.5,-.25,-13.5,-20,-.25,-18,-15.5,-.25,-22.5],
// 4 15 -15.5 -.25 -13.5 -12.3 -.25 -22 -1.8 -.25 -2.5 -15.5 -.25 -7
  [4,15,-15.5,-.25,-13.5,-12.3,-.25,-22,-1.8,-.25,-2.5,-15.5,-.25,-7],
// 4 15 -10.05 -.25 -27.25 -12.3 -.25 -22 -15.5 -.25 -22.5 -15.5 -.25 -29
  [4,15,-10.05,-.25,-27.25,-12.3,-.25,-22,-15.5,-.25,-22.5,-15.5,-.25,-29],
// 4 15 -10.05 -.25 -27.25 -15.5 -.25 -29 -20 -.25 -33.5 -20 -.25 -34.7
  [4,15,-10.05,-.25,-27.25,-15.5,-.25,-29,-20,-.25,-33.5,-20,-.25,-34.7],
// 4 15 -10.05 -.25 -27.25 -20 -.25 -34.7 -1.8 -.25 -33.5 -1.8 -.25 -27.25
  [4,15,-10.05,-.25,-27.25,-20,-.25,-34.7,-1.8,-.25,-33.5,-1.8,-.25,-27.25],
// 3 15 -20 -.25 -58 -1.8 -.25 -33.5 -20 -.25 -34.7
  [3,15,-20,-.25,-58,-1.8,-.25,-33.5,-20,-.25,-34.7],
// 4 15 20 -.25 -58 3.7 -.25 -33.5 -1.8 -.25 -33.5 -20 -.25 -58
  [4,15,20,-.25,-58,3.7,-.25,-33.5,-1.8,-.25,-33.5,-20,-.25,-58],
// 4 15 20 -.25 -58 20 -.25 -34.7 15.7 -.25 -33.5 3.7 -.25 -33.5
  [4,15,20,-.25,-58,20,-.25,-34.7,15.7,-.25,-33.5,3.7,-.25,-33.5],
// 4 15 20 -.25 58 9.7 -.25 31.5 9.7 -.25 .5 20 -.25 -1.3
  [4,15,20,-.25,58,9.7,-.25,31.5,9.7,-.25,.5,20,-.25,-1.3],
// 3 15 20 -.25 58 4.2 -.25 31.5 9.7 -.25 31.5
  [3,15,20,-.25,58,4.2,-.25,31.5,9.7,-.25,31.5],
// 4 15 -20 -.25 52.24072 -.8 -.25 31.5 4.2 -.25 31.5 20 -.25 58
  [4,15,-20,-.25,52.24072,-.8,-.25,31.5,4.2,-.25,31.5,20,-.25,58],
// 3 15 -20 -.25 52.24072 -6.3 -.25 31.5 -.8 -.25 31.5
  [3,15,-20,-.25,52.24072,-6.3,-.25,31.5,-.8,-.25,31.5],
// 4 15 -20 -.25 52.24072 -20 -.25 -1.3 -6.3 -.25 .5 -6.3 -.25 31.5
  [4,15,-20,-.25,52.24072,-20,-.25,-1.3,-6.3,-.25,.5,-6.3,-.25,31.5],
];
module ldraw_lib__4162510b(step=0, col=false, unit=2/5, alt=false, line=0.2, solid=!$preview)
    makepoly(ldraw_lib__4162510b(), step=step, col=col, unit=unit, alt=alt, line=line, solid=solid);
ldraw_lib__4162510b(line=0.2);
